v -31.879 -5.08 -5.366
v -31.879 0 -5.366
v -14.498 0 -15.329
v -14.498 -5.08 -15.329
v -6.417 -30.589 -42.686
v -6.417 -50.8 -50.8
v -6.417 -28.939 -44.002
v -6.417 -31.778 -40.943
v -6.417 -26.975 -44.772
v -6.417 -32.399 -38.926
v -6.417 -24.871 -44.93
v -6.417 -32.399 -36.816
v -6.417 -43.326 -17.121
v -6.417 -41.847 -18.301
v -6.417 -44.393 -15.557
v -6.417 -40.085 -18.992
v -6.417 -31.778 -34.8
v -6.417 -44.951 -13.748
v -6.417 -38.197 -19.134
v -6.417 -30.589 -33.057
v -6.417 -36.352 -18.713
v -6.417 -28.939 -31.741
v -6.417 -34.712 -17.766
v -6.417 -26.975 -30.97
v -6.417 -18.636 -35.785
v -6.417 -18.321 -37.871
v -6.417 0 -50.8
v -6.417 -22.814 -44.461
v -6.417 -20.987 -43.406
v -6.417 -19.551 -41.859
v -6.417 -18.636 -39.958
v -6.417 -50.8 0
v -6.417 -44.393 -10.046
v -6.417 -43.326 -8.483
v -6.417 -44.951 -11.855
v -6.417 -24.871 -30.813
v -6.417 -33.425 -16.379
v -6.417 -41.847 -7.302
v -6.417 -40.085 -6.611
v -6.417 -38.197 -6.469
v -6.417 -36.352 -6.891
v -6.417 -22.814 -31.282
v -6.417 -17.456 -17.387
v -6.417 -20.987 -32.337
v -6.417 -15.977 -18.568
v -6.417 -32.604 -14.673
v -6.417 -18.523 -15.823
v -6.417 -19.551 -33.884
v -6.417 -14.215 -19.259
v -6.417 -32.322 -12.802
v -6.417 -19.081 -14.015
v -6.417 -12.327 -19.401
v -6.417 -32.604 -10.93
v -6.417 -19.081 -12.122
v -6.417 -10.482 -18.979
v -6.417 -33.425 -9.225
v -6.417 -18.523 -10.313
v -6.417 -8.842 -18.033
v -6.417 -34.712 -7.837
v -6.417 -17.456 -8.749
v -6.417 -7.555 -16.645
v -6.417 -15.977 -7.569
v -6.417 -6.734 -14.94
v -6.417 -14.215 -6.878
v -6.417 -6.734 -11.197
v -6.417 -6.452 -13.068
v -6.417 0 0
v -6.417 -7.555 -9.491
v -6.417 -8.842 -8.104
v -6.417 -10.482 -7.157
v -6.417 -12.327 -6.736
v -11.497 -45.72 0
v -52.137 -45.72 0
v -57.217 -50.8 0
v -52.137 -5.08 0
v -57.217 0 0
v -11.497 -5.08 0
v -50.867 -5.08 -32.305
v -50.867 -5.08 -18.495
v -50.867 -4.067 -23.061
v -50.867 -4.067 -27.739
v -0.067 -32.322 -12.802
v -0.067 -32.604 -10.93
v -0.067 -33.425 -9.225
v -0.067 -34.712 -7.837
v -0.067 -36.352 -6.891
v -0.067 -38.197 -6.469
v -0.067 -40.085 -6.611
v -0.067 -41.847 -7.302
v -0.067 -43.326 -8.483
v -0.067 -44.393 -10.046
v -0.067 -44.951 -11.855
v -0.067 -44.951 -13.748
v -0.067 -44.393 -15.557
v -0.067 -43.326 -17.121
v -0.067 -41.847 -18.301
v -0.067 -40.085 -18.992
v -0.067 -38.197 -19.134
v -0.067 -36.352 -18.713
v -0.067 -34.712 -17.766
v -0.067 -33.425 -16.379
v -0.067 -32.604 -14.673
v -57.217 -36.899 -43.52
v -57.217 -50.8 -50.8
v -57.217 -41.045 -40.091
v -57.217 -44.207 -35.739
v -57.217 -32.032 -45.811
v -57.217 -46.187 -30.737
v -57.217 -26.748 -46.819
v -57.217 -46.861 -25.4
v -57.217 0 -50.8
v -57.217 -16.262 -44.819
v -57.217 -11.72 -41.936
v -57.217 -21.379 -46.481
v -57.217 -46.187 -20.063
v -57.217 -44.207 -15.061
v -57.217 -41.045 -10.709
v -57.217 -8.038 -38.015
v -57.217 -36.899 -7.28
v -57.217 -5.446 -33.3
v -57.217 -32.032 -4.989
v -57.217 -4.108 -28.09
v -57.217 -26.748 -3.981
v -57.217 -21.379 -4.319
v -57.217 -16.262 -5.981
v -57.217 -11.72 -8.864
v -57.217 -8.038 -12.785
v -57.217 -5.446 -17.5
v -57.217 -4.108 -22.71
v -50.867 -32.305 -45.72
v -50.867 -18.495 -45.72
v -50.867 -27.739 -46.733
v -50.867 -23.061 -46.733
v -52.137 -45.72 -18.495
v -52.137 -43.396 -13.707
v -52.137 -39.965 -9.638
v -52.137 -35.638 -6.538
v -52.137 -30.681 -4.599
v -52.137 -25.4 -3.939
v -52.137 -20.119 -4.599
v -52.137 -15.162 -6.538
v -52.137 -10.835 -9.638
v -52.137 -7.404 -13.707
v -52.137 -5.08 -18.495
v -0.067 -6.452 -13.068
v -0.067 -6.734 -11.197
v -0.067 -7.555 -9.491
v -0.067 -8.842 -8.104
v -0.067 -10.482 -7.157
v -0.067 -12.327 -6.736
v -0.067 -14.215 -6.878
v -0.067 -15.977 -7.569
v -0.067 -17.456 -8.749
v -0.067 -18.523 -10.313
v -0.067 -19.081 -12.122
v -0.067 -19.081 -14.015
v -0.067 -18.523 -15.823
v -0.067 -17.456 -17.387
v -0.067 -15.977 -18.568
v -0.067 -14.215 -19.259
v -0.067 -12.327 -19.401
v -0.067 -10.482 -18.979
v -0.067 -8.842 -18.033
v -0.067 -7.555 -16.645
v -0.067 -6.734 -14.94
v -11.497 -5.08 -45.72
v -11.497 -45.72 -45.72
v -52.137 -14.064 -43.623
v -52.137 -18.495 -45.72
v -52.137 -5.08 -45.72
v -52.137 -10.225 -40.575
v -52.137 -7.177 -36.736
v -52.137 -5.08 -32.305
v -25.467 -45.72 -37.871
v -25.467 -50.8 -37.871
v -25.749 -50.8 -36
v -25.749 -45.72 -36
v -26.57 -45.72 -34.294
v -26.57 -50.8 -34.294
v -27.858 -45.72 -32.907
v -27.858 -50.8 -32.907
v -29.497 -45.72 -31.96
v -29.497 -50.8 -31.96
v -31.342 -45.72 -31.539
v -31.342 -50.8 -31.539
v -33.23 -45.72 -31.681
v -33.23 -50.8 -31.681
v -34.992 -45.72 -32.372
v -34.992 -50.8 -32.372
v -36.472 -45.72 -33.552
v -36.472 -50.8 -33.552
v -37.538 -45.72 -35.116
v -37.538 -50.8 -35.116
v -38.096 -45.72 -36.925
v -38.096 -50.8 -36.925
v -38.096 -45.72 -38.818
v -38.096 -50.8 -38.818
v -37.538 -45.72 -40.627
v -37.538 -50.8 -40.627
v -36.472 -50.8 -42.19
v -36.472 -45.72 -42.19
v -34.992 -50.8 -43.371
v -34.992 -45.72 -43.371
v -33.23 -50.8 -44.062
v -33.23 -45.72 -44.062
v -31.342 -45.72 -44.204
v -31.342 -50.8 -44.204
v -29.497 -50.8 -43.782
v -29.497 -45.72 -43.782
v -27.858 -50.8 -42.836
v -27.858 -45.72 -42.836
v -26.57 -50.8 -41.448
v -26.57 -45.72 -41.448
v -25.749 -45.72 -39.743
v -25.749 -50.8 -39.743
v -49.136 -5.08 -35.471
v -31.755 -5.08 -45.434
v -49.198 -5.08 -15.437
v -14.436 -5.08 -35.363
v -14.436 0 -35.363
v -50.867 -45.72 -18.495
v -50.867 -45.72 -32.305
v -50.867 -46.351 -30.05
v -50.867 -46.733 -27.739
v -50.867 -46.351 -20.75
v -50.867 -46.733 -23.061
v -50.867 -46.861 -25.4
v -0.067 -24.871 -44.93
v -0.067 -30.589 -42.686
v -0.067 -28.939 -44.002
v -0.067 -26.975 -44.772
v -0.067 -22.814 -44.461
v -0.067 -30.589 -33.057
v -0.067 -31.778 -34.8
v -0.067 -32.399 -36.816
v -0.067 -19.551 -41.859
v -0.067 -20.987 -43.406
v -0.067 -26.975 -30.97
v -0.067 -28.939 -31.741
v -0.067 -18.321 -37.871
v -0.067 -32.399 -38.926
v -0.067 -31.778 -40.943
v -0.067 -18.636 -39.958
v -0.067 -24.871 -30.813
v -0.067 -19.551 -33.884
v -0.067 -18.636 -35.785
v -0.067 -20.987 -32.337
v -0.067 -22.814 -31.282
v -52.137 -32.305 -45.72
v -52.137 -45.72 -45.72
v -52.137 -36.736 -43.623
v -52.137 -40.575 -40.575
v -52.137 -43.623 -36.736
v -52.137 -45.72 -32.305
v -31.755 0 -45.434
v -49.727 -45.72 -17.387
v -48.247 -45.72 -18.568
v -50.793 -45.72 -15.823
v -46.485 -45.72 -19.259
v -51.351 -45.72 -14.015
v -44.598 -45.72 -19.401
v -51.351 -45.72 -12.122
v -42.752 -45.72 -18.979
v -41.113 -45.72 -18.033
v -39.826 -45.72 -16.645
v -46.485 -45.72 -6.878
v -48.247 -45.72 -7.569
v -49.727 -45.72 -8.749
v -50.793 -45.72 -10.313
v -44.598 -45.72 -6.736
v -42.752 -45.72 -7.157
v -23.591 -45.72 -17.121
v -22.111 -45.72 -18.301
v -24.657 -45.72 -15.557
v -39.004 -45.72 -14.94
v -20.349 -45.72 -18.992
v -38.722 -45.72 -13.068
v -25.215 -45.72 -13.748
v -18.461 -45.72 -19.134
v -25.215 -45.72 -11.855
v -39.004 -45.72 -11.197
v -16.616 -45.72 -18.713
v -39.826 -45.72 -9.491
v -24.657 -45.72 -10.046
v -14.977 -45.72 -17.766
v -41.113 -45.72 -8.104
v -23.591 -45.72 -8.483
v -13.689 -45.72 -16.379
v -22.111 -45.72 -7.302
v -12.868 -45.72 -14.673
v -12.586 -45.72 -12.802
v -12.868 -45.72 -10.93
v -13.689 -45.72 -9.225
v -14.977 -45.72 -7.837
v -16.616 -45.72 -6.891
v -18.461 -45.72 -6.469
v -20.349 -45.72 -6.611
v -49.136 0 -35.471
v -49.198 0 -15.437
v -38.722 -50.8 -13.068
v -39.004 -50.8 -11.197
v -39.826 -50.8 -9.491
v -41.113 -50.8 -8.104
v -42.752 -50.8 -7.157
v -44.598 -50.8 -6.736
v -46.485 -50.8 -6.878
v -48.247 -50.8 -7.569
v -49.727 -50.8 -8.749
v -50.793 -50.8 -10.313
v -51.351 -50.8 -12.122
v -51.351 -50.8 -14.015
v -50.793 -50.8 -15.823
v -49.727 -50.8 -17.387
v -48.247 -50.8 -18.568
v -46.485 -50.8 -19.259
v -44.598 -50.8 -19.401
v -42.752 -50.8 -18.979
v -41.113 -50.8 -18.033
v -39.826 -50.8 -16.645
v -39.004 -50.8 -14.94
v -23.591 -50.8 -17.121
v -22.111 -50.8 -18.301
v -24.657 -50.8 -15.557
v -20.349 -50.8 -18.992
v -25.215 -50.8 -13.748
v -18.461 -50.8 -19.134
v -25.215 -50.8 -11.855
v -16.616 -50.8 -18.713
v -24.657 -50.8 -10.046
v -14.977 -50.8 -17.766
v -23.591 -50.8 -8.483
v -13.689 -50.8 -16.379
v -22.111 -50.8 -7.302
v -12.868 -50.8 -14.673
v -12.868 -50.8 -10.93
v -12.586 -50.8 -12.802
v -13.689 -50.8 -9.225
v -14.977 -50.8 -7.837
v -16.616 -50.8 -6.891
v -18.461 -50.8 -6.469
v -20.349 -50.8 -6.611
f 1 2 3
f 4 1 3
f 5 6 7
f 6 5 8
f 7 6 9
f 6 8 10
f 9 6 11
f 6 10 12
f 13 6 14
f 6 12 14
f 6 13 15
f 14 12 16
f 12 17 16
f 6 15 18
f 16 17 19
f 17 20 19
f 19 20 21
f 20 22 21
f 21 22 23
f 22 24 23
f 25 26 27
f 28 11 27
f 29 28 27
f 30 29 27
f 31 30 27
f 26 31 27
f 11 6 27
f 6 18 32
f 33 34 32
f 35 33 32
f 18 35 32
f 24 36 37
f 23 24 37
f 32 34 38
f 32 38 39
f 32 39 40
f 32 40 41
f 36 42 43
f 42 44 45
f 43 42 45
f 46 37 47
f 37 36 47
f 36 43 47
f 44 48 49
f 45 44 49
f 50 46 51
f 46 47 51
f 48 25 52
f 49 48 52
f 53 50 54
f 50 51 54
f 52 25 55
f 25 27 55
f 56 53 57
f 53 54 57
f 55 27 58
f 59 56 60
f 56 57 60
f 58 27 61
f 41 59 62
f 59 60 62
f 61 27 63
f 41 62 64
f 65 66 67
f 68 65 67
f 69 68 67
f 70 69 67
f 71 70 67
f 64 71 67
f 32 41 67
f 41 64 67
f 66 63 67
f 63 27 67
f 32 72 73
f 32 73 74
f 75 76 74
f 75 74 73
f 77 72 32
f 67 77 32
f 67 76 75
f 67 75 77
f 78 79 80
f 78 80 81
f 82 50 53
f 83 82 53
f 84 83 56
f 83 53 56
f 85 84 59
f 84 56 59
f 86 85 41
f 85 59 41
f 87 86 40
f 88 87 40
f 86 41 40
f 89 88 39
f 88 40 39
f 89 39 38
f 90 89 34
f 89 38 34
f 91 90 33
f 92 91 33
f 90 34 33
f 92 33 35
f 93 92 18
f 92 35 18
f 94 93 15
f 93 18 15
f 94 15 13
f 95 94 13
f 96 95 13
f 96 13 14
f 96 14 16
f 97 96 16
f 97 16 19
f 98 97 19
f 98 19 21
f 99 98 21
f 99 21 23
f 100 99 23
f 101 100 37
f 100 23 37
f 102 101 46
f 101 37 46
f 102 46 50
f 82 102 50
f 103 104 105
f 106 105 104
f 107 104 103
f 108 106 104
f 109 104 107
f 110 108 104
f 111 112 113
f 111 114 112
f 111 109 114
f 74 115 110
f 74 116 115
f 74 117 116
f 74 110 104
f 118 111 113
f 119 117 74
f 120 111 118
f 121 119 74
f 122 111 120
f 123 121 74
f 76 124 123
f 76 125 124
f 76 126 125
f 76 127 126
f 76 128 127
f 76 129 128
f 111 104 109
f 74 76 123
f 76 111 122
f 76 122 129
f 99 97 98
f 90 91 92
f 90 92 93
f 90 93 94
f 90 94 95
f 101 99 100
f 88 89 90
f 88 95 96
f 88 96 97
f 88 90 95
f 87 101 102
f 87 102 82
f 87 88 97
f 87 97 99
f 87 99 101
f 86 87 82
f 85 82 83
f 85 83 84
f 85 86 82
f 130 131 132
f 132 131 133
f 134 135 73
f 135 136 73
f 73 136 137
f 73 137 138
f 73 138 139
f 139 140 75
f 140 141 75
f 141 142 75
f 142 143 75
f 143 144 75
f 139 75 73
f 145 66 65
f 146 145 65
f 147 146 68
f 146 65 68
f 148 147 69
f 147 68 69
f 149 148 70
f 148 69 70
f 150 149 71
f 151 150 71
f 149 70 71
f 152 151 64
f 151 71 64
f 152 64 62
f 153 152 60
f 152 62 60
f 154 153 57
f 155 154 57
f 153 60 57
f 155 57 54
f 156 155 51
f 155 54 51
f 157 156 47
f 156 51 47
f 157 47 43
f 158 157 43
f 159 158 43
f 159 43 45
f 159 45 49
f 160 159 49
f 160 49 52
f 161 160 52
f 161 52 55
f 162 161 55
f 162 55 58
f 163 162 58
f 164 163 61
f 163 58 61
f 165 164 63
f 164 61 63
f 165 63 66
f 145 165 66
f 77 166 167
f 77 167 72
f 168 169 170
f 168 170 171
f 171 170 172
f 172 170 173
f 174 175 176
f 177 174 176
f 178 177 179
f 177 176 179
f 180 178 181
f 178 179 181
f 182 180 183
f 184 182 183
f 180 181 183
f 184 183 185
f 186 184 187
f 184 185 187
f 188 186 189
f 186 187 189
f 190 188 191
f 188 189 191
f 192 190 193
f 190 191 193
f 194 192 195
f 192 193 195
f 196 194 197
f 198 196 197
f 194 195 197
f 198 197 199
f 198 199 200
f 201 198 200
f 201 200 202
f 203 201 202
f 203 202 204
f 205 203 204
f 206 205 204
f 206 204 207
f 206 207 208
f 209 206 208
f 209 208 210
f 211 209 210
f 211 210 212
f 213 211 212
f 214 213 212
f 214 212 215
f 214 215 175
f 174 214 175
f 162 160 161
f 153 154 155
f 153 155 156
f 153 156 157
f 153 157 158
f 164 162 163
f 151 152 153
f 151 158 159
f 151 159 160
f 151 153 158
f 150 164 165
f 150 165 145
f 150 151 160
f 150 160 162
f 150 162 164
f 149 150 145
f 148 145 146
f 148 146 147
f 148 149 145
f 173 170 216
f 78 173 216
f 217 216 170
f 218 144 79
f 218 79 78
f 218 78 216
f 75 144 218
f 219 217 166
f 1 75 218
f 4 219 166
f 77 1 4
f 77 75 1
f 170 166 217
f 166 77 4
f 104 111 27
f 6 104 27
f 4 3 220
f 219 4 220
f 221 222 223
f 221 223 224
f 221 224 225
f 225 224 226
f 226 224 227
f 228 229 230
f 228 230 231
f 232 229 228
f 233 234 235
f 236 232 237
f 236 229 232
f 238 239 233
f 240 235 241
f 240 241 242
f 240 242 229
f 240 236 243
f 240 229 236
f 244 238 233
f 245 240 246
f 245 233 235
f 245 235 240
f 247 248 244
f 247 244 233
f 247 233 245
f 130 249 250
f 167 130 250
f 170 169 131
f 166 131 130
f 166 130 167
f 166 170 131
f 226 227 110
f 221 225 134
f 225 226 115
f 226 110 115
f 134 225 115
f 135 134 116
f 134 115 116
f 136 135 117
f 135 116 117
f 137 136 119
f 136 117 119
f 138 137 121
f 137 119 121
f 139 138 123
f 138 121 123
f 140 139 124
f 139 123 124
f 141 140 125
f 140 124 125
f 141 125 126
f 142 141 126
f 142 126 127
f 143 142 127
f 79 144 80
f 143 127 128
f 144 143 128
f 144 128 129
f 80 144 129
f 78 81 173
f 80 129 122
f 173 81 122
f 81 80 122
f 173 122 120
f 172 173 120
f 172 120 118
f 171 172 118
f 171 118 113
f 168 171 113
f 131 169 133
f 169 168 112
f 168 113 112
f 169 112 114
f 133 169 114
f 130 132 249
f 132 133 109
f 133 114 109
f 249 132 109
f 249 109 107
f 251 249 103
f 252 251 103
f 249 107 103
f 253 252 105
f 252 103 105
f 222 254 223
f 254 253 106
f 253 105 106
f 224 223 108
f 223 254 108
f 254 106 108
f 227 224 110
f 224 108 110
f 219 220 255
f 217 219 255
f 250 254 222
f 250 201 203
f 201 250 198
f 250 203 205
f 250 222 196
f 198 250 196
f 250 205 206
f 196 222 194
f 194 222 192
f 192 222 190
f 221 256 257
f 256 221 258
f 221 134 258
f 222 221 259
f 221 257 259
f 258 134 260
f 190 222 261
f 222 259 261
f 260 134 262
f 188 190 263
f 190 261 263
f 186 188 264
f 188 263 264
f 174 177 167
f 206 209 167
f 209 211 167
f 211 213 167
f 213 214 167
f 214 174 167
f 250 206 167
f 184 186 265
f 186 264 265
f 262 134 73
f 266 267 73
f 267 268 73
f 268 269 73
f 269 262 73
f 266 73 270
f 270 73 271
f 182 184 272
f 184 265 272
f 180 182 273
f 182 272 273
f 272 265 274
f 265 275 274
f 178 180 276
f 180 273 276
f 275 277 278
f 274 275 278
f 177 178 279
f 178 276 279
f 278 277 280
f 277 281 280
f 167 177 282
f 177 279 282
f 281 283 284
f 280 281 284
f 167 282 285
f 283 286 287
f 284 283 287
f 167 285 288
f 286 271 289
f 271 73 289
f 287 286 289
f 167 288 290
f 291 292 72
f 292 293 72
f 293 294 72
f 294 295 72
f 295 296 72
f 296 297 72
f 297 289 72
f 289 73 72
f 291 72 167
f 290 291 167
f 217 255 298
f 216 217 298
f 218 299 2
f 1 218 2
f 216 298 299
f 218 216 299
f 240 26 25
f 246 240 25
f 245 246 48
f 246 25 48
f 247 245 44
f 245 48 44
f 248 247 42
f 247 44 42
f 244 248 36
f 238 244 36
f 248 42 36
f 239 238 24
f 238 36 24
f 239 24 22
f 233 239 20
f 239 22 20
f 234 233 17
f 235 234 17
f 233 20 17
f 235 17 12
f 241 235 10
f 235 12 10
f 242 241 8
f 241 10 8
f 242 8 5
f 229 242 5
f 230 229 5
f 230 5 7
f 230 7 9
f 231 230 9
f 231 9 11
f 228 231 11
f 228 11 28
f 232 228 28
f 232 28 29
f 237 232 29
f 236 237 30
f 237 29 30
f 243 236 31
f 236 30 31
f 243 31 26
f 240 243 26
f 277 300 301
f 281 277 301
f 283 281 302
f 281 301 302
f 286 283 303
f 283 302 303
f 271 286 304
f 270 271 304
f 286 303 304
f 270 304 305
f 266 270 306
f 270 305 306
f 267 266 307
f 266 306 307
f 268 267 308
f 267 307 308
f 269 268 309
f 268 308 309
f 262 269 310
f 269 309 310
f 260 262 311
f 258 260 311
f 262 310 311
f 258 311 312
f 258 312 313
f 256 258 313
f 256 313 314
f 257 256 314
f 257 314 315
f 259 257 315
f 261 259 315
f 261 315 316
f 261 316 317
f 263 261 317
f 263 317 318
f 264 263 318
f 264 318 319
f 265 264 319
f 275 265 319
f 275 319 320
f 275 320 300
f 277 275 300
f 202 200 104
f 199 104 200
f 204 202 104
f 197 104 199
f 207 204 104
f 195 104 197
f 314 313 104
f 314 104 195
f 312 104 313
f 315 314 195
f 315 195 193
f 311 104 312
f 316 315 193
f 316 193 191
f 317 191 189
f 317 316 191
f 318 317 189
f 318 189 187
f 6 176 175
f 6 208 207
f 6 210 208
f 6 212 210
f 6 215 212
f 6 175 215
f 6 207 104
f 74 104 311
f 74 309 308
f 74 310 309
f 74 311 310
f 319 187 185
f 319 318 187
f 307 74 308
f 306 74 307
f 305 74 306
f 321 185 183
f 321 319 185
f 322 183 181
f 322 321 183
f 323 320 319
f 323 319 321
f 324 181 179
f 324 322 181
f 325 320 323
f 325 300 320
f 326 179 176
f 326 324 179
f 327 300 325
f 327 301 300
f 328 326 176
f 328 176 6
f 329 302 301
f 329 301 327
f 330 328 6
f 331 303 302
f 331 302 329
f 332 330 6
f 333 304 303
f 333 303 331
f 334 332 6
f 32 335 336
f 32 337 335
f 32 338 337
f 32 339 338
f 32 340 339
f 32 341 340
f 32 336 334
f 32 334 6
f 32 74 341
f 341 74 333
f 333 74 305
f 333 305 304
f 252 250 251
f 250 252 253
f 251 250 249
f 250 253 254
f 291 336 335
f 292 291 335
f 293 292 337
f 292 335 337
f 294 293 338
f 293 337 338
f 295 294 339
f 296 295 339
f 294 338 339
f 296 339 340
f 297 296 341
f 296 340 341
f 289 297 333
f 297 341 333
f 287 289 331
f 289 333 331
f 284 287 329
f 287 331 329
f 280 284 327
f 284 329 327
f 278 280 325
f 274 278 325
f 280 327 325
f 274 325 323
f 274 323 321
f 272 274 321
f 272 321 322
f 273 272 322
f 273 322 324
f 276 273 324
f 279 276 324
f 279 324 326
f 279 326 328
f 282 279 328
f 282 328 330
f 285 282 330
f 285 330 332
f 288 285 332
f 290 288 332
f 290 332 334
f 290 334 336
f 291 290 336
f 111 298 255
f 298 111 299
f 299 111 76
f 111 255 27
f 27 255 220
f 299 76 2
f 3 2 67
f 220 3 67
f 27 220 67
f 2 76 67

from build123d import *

# Parameters (mm, degrees)
F0_W      = 50.8
F0_H      = 50.8
F1_DEPTH  = 50.8
F3_T      = -5.08
F5_DEPTH  = 6.35
F6_R      = 21.461157
F7_DEPTH  = 6.35
F8_R      = 6.35
F8_R_2    = 7.078549
F9_DEPTH  = 6.35
F10_R     = 6.35
F11_DEPTH = 6.35


with BuildPart() as f1:
    # F0 (on Front) → F1 (new body)
    with BuildSketch(Plane.XZ):
        with Locations((-31.816838, -25.4)):
            Rectangle(F0_W, F0_H)
    extrude(amount=F1_DEPTH)

    # F3
    f3_openings = [f1.faces().sort_by_distance(p)[0] for p in [
        (-31.816838, -25.4, 0),
    ]]
    offset(amount=F3_T, openings=f3_openings)

    # F4 (on face) → F5 (cut)
    with BuildSketch(Plane(origin=(0, 0, 0), x_dir=(-1, 0, 0), z_dir=(0, 1, 0))):
        Polygon((49.197904, -15.436697), (31.878897, -5.365904), (14.497831, -15.329207), (14.435772, -35.363303), (31.754779, -45.434096), (49.135845, -35.470793), align=None)
    extrude(amount=-F5_DEPTH, mode=Mode.SUBTRACT)

    # F6 (on face) → F7 (cut)
    with BuildSketch(Plane(origin=(-57.216838, 0, 0), x_dir=(0, -1, 0), z_dir=(-1, 0, 0))):
        with Locations((25.4, -25.4)):
            Circle(F6_R)
    extrude(amount=-F7_DEPTH, mode=Mode.SUBTRACT)

    # F8 (on face) → F9 (join)
    with BuildSketch(Plane.YZ.offset(-6.416838)):
        with Locations((-38.671501, -12.8016)):
            Circle(F8_R)
        with Locations((-12.8016, -13.0683)):
            Circle(F8_R)
        with Locations((-25.4, -37.871402)):
            Circle(F8_R_2)
    extrude(amount=F9_DEPTH)

    # F10 (on face) → F11 (cut)
    with BuildSketch(Plane.XZ.offset(50.8)):
        with Locations((-31.816838, -37.871402)):
            Circle(F10_R)
        with Locations((-18.935701, -12.8016)):
            Circle(F10_R)
        with Locations((-45.072298, -13.0683)):
            Circle(F10_R)
    extrude(amount=-F11_DEPTH, mode=Mode.SUBTRACT)


solid = f1.part
